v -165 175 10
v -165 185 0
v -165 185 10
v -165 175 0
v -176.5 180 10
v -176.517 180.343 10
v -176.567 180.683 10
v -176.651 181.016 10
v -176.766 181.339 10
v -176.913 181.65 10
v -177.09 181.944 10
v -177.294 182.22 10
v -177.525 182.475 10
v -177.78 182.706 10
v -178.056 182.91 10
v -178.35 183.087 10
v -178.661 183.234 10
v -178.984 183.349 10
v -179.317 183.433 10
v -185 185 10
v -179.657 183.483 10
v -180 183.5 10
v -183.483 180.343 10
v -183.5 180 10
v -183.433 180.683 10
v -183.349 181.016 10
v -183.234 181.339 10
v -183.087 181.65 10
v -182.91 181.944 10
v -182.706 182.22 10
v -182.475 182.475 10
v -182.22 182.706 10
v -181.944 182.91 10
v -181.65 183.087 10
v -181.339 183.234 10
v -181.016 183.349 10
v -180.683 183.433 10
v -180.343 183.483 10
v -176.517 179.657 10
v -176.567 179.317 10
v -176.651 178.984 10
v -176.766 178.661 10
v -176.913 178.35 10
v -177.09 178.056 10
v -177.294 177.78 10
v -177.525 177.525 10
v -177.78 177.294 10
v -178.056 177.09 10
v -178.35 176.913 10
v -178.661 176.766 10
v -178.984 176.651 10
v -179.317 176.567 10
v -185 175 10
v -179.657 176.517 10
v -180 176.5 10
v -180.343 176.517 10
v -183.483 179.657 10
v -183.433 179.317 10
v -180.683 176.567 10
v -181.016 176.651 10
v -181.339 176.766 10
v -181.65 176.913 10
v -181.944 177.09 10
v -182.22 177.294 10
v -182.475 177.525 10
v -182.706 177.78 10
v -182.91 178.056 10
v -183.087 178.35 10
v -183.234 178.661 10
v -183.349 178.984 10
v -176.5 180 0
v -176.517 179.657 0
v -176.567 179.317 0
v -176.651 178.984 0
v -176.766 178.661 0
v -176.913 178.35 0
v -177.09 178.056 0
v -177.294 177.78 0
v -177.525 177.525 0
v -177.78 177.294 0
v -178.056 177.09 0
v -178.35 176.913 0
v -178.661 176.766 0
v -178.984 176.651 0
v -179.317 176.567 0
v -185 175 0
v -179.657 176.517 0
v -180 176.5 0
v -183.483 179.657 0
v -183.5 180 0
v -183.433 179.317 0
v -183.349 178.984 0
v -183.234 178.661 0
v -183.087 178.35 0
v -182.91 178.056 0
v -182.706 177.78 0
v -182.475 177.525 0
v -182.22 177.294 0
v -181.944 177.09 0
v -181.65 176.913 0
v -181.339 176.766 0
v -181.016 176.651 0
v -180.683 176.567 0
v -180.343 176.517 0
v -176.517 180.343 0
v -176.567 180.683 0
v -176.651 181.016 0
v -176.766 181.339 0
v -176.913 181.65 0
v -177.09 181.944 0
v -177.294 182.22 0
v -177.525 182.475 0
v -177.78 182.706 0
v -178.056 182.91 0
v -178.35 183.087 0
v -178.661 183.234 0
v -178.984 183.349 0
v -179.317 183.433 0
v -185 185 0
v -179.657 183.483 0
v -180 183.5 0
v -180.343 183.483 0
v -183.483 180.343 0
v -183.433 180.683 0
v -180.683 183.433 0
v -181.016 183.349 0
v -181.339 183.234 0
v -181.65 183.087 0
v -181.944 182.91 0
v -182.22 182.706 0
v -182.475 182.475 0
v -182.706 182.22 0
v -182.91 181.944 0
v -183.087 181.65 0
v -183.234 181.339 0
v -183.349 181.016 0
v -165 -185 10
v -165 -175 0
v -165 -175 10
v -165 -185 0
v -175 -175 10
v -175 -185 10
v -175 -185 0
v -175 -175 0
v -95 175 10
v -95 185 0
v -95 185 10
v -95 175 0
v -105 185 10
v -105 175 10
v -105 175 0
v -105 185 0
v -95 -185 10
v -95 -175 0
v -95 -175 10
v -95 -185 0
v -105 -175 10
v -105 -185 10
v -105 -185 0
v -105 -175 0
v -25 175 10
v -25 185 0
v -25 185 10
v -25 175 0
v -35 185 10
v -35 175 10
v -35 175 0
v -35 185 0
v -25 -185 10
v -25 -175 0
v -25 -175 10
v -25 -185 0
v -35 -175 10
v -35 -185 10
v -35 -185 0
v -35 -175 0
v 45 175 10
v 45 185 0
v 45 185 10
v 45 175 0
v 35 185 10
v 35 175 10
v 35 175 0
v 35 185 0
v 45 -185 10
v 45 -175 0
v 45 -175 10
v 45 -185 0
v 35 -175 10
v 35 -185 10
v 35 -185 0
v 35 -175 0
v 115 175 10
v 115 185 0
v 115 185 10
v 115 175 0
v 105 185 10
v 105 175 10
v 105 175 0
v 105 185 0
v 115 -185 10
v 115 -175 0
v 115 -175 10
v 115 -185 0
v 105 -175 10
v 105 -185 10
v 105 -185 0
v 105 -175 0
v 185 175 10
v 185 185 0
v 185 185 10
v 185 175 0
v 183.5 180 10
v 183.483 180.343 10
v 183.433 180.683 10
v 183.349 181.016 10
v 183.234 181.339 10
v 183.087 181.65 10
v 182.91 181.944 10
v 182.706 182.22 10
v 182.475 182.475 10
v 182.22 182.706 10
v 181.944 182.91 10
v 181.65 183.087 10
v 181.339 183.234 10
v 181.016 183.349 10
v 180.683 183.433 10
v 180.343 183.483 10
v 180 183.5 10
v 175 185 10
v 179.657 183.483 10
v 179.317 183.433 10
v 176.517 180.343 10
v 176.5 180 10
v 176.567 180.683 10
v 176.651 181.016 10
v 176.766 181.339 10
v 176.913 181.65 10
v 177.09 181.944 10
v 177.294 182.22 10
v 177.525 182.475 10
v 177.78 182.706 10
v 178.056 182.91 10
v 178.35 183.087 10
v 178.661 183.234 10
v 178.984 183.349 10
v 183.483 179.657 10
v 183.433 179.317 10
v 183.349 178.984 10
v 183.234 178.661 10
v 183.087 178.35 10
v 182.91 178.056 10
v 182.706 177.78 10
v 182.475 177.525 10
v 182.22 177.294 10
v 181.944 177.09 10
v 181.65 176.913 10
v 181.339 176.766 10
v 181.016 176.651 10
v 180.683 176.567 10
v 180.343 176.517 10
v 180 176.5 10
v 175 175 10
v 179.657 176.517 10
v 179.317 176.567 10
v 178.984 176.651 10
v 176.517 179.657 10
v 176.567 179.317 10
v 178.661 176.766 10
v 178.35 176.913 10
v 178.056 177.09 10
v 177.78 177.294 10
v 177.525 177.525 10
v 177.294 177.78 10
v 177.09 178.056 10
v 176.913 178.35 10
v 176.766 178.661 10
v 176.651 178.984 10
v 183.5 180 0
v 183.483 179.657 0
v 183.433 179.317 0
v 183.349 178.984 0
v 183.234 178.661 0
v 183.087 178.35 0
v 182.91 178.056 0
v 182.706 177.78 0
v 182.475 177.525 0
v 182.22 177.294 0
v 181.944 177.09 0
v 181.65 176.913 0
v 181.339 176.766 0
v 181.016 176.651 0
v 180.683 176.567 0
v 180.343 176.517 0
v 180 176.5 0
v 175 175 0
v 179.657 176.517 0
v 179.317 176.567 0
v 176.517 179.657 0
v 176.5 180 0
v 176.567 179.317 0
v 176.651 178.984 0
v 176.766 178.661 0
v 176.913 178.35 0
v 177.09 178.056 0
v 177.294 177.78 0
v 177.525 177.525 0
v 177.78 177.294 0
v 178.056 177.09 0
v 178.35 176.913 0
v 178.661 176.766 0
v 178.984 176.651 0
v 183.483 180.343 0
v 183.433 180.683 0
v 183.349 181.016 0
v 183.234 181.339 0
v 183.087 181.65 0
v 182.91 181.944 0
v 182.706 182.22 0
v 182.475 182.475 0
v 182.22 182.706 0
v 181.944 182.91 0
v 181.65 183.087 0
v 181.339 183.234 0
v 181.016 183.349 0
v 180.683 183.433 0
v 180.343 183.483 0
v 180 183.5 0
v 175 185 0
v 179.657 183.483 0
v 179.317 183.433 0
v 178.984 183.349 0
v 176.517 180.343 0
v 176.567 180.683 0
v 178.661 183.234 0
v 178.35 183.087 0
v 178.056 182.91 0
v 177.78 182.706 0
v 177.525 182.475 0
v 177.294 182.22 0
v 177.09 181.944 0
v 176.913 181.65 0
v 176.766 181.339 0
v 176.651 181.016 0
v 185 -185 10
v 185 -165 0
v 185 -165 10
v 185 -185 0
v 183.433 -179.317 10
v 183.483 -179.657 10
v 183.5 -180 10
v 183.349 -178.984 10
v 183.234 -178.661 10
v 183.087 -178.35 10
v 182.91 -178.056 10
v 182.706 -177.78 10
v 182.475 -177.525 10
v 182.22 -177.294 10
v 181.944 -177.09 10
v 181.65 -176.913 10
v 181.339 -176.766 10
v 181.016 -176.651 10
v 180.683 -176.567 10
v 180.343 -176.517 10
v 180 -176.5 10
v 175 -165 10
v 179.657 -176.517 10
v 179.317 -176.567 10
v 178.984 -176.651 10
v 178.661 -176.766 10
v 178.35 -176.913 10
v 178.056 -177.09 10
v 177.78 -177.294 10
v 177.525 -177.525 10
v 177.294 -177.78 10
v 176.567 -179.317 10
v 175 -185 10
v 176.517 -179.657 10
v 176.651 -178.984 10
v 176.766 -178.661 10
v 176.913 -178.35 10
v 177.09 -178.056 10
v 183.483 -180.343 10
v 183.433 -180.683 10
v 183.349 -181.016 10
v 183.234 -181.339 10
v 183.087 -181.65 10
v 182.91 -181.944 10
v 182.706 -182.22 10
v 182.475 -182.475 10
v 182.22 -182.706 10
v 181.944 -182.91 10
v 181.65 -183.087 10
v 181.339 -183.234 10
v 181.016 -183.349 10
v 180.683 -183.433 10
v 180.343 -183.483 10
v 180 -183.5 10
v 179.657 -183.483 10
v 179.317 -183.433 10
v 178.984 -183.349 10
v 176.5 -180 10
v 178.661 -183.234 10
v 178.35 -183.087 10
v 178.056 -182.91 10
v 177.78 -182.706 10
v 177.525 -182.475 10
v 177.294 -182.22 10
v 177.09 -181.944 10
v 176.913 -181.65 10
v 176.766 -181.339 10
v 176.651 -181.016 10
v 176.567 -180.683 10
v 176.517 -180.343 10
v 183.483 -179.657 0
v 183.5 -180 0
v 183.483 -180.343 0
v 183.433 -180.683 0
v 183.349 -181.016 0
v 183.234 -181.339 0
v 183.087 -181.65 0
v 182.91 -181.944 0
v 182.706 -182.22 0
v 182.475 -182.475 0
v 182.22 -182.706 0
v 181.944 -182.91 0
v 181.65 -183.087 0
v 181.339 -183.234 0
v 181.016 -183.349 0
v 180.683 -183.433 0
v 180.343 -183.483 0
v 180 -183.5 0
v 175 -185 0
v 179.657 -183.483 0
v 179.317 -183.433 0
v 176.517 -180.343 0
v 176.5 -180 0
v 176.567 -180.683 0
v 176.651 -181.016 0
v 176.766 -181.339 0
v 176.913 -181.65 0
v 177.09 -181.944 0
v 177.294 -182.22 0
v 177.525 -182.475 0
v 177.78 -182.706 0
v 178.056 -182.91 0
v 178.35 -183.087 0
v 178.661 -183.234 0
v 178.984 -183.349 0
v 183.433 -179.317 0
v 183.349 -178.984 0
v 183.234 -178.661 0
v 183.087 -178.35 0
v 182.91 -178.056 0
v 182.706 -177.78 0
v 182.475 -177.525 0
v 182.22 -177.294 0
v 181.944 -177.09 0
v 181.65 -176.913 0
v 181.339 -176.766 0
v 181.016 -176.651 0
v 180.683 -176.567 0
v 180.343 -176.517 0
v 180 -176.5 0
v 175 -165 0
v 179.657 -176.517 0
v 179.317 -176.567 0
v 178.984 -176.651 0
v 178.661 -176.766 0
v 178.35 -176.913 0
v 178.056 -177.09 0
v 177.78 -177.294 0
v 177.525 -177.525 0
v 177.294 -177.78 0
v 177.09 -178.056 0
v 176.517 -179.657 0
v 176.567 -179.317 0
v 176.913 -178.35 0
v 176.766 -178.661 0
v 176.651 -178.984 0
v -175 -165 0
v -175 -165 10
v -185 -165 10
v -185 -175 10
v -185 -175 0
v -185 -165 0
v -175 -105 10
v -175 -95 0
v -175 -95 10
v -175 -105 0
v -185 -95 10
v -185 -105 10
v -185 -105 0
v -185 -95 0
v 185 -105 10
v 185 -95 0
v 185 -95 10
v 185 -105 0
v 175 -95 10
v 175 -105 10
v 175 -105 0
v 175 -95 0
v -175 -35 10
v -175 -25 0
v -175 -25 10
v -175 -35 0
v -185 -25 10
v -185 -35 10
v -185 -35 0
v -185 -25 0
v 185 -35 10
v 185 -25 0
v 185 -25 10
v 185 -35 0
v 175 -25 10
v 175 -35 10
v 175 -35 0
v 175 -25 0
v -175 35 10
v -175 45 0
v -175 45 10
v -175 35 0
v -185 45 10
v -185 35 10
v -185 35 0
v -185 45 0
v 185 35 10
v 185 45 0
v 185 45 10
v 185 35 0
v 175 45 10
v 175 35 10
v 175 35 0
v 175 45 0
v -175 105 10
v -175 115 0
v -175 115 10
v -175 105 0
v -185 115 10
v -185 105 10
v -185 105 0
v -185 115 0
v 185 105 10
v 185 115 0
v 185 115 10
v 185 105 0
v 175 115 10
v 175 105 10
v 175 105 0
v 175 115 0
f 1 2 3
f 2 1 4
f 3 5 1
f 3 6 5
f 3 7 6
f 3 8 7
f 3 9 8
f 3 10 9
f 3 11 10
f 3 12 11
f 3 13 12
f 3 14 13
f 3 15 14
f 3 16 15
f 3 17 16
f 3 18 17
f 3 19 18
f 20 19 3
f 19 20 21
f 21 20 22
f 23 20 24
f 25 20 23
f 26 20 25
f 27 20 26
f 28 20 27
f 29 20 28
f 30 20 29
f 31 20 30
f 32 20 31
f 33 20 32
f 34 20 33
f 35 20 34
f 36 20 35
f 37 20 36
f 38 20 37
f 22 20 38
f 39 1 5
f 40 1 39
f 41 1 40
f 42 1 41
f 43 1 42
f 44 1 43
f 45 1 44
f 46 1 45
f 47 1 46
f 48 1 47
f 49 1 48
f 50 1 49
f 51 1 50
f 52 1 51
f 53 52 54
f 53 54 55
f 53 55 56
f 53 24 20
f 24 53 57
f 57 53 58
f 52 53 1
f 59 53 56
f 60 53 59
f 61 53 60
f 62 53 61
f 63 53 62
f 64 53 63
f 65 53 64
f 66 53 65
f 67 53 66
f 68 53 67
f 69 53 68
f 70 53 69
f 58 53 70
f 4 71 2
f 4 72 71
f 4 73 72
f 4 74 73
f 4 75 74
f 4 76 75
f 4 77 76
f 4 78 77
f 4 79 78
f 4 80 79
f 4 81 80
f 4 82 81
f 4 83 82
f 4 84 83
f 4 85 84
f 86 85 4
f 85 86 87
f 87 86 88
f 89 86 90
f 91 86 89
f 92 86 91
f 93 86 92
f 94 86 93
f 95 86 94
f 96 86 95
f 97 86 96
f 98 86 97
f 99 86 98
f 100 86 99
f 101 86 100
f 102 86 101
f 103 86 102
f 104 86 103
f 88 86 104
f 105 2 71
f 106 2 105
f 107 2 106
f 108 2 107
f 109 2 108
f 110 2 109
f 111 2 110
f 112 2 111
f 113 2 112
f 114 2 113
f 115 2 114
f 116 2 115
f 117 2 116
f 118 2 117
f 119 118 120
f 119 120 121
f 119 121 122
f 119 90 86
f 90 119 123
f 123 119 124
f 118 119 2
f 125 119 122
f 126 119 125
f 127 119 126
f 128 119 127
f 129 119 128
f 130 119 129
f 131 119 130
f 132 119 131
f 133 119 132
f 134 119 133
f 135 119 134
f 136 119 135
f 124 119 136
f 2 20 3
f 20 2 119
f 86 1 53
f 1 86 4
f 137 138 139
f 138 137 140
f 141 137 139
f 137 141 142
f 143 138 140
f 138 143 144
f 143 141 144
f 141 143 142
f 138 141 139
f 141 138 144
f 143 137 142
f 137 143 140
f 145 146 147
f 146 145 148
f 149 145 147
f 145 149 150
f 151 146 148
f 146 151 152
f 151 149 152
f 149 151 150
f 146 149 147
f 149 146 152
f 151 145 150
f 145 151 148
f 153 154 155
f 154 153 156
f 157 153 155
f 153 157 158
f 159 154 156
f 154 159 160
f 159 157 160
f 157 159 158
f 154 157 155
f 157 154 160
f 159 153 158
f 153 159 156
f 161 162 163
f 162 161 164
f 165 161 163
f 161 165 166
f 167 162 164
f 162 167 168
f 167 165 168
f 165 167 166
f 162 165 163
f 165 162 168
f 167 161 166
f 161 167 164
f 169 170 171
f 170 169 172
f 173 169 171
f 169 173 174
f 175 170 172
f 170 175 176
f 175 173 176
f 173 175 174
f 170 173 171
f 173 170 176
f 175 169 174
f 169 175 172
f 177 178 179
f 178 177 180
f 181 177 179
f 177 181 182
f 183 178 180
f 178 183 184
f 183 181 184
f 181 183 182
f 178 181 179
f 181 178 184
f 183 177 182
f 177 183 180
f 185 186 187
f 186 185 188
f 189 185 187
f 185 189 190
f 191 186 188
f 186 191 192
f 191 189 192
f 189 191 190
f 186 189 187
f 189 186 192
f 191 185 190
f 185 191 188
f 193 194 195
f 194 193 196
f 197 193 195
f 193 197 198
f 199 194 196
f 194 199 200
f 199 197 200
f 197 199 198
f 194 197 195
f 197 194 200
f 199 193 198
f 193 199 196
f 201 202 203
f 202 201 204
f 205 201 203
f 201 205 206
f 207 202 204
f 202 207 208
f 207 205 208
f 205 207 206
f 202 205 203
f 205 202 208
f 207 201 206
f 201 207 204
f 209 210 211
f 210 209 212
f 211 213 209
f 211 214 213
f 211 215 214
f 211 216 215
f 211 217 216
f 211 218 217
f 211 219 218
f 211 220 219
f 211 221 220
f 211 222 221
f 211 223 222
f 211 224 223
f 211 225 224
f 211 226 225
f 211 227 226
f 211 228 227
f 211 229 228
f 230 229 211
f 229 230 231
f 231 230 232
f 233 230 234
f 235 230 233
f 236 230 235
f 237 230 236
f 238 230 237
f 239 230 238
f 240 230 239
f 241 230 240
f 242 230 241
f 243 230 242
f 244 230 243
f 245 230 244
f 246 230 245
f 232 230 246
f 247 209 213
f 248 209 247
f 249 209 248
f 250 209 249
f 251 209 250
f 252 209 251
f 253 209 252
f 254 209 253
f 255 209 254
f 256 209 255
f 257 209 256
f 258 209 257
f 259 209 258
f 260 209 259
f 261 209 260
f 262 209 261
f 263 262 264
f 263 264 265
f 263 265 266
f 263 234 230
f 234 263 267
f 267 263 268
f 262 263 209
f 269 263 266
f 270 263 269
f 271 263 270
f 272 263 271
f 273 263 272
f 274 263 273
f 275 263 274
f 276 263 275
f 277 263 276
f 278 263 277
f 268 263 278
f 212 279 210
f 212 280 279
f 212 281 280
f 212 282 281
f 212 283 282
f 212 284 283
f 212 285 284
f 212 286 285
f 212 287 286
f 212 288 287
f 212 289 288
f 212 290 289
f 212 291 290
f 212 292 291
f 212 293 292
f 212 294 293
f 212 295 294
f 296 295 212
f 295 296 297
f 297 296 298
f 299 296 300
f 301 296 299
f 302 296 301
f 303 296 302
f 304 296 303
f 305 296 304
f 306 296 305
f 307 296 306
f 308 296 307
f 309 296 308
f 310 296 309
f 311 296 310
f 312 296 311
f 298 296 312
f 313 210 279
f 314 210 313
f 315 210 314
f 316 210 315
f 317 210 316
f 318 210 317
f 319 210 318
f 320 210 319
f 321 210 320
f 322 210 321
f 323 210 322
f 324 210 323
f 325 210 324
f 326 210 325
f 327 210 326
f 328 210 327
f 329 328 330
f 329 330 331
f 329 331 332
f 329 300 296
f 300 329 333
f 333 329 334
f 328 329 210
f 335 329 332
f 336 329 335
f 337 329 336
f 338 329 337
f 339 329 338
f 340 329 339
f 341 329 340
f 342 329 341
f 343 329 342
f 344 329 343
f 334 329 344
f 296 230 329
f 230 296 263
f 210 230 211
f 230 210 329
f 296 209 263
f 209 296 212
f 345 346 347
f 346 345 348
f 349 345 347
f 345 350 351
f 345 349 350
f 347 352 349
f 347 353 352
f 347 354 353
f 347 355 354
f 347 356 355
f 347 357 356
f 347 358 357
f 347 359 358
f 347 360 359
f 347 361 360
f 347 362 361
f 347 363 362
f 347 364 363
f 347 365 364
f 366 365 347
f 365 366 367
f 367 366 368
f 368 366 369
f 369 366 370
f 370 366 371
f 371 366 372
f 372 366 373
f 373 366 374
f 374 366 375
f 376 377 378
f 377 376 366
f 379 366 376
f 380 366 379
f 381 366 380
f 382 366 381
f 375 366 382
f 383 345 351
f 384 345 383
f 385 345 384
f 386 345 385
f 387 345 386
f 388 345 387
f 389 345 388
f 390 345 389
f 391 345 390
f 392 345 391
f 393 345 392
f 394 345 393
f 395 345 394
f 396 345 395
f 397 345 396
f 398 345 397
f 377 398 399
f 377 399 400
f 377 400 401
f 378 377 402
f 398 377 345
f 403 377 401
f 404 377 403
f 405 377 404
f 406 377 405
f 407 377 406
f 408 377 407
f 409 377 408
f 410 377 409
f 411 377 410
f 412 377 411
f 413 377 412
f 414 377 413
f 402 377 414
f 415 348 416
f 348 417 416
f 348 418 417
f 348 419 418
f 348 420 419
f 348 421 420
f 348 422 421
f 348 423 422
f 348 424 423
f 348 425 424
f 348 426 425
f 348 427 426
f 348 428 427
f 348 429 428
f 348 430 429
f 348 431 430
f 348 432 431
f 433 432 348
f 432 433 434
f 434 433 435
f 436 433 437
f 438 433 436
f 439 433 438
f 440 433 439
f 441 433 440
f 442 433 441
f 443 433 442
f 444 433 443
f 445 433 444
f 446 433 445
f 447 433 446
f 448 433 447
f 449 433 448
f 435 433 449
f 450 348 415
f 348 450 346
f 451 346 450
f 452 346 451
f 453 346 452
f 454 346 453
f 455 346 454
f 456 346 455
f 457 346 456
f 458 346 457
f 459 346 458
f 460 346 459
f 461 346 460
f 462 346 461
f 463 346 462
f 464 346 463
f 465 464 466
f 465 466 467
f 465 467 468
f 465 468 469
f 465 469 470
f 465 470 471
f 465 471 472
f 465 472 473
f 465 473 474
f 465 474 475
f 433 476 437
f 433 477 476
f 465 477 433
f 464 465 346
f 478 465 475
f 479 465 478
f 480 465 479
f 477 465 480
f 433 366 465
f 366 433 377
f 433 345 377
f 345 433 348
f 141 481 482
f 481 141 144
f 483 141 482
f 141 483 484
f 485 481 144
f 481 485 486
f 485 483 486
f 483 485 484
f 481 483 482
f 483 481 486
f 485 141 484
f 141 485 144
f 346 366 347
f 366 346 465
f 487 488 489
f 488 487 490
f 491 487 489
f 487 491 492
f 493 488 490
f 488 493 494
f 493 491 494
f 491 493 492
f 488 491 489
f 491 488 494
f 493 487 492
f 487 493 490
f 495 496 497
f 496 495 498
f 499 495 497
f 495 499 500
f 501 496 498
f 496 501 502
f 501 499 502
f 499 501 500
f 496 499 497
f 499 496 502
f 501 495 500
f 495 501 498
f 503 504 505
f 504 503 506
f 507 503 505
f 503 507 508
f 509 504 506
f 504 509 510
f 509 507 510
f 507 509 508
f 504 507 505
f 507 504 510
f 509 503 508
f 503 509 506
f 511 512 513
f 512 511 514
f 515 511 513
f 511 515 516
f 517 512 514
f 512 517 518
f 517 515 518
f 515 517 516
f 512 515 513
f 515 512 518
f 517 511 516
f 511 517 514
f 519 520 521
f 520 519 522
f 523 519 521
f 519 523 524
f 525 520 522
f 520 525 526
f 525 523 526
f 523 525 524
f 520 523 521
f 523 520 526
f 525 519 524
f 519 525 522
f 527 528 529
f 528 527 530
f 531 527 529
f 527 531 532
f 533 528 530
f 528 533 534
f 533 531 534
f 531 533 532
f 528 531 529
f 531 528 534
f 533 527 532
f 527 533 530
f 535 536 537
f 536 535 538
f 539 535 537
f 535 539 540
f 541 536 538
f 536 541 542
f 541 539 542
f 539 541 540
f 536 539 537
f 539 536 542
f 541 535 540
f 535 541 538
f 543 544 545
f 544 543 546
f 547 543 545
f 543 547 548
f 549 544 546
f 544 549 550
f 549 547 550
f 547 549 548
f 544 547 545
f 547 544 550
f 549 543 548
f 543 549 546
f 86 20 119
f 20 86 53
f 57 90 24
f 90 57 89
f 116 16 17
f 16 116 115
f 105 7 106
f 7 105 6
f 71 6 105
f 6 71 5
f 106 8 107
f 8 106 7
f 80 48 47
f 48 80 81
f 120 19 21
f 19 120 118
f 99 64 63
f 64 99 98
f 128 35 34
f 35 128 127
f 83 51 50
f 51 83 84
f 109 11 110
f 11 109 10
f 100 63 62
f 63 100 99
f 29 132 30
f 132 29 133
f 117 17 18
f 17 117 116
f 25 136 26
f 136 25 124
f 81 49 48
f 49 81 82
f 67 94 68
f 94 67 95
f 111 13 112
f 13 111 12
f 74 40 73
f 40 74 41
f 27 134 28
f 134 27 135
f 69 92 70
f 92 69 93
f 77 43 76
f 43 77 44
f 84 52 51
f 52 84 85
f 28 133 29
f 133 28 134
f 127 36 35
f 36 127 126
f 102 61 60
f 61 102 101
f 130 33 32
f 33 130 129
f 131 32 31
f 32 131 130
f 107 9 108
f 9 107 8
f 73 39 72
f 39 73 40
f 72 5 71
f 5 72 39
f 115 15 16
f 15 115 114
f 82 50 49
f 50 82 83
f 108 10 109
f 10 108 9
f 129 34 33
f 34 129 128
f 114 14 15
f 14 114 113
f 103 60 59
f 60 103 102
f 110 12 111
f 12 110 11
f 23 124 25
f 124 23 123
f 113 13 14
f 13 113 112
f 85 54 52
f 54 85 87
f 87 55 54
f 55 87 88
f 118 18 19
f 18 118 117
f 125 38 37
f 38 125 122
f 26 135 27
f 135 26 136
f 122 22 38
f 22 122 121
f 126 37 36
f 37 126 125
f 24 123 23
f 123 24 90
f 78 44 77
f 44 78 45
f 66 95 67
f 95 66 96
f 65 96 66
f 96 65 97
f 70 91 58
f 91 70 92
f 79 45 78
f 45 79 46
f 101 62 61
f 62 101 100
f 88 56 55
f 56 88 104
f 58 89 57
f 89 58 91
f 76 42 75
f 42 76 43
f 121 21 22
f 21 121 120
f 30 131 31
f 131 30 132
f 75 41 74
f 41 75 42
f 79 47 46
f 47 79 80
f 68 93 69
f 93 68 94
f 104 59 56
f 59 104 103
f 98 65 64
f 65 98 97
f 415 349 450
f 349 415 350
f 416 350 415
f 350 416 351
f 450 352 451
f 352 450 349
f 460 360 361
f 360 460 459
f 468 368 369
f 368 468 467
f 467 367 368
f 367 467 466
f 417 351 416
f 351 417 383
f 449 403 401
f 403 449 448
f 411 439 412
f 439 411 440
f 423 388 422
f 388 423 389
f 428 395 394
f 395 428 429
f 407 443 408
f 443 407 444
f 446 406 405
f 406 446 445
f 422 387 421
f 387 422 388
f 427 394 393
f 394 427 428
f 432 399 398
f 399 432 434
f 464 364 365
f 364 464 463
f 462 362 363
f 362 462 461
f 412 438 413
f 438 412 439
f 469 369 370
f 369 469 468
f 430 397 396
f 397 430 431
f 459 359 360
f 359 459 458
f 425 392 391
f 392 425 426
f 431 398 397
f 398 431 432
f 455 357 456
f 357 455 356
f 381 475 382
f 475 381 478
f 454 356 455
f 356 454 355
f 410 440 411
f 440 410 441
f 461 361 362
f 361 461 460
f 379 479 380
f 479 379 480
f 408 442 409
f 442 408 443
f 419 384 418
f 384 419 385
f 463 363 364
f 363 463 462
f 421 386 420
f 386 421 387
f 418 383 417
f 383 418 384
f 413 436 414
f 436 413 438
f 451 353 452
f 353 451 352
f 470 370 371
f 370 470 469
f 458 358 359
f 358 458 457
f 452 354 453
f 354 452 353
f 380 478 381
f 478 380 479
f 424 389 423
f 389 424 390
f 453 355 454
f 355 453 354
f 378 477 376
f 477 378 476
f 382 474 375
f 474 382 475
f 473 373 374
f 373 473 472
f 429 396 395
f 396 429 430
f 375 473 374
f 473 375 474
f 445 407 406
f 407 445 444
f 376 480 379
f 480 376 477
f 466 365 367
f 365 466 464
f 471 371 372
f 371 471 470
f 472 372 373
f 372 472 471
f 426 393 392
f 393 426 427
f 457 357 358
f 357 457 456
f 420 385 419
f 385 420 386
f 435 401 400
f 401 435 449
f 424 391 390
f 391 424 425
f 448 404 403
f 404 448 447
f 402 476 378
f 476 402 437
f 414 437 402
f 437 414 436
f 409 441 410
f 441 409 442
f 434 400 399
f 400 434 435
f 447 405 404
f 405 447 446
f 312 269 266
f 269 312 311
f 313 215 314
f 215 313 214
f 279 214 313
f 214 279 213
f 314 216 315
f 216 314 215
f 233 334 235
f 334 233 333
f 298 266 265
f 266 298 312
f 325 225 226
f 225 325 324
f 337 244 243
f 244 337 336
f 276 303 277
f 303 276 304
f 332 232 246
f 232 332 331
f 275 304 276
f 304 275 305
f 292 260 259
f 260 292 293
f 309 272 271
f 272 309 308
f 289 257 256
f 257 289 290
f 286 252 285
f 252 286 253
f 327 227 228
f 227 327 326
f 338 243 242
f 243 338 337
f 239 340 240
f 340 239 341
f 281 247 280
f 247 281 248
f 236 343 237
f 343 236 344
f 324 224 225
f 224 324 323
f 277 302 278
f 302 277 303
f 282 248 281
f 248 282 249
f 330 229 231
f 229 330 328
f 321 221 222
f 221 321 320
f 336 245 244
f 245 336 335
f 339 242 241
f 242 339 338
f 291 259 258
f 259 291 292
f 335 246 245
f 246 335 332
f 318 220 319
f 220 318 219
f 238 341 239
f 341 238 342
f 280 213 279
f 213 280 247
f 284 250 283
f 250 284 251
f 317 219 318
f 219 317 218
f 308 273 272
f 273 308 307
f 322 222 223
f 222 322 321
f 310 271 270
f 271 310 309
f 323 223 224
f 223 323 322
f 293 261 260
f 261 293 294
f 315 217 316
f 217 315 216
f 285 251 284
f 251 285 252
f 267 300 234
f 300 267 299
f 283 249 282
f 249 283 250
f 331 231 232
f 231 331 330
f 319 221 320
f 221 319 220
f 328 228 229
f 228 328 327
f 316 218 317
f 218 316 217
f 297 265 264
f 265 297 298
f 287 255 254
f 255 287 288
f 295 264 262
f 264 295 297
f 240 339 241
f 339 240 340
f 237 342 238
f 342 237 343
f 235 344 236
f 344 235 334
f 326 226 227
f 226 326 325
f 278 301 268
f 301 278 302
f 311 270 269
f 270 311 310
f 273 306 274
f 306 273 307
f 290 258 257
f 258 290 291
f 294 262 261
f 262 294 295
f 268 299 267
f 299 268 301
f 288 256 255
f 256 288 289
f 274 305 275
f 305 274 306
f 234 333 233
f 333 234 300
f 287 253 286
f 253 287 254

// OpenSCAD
// ring_37.scad - ring index 37 (z bottom = 370 mm)
$fn = 64; bar = 10; half_b = bar/2; outer = 370; half_outer = outer/2;
front_y = 180; back_y = -180; left_x = -180; right_x = 180;
x_centers = [-170, -100, -30, 40, 110, 180];
z_centers = [5, 85, 155, 225, 295, 365, 435, 505, 575, 645, 715]; ring_z = 370;
module place_box(cx, cy, sx, sy) { translate([cx - sx/2, cy - sy/2, 0]) cube([sx, sy, bar]); }

difference() { union() {
    for (x = x_centers) { place_box(x, front_y, bar, bar); place_box(x, back_y, bar, bar); }
    for (y = x_centers) { place_box(left_x, y, bar, bar); place_box(right_x, y, bar, bar); }
    for (zc = z_centers) if ((zc - half_b < ring_z + bar) && (zc + half_b > ring_z)) {
        translate([-half_outer, front_y - half_b, 0]) cube([outer, bar, bar]);
        translate([-half_outer, back_y - half_b, 0])  cube([outer, bar, bar]);
        translate([left_x - half_b, -half_outer, 0])  cube([bar, outer, bar]);
        translate([right_x - half_b, -half_outer, 0]) cube([bar, outer, bar]);
    }
  }
  for (cx = [-180, 180]) for (cy = [-180, 180]) translate([cx, cy, 0]) cylinder(h = bar, r = 3.5, $fn = 64);
}
